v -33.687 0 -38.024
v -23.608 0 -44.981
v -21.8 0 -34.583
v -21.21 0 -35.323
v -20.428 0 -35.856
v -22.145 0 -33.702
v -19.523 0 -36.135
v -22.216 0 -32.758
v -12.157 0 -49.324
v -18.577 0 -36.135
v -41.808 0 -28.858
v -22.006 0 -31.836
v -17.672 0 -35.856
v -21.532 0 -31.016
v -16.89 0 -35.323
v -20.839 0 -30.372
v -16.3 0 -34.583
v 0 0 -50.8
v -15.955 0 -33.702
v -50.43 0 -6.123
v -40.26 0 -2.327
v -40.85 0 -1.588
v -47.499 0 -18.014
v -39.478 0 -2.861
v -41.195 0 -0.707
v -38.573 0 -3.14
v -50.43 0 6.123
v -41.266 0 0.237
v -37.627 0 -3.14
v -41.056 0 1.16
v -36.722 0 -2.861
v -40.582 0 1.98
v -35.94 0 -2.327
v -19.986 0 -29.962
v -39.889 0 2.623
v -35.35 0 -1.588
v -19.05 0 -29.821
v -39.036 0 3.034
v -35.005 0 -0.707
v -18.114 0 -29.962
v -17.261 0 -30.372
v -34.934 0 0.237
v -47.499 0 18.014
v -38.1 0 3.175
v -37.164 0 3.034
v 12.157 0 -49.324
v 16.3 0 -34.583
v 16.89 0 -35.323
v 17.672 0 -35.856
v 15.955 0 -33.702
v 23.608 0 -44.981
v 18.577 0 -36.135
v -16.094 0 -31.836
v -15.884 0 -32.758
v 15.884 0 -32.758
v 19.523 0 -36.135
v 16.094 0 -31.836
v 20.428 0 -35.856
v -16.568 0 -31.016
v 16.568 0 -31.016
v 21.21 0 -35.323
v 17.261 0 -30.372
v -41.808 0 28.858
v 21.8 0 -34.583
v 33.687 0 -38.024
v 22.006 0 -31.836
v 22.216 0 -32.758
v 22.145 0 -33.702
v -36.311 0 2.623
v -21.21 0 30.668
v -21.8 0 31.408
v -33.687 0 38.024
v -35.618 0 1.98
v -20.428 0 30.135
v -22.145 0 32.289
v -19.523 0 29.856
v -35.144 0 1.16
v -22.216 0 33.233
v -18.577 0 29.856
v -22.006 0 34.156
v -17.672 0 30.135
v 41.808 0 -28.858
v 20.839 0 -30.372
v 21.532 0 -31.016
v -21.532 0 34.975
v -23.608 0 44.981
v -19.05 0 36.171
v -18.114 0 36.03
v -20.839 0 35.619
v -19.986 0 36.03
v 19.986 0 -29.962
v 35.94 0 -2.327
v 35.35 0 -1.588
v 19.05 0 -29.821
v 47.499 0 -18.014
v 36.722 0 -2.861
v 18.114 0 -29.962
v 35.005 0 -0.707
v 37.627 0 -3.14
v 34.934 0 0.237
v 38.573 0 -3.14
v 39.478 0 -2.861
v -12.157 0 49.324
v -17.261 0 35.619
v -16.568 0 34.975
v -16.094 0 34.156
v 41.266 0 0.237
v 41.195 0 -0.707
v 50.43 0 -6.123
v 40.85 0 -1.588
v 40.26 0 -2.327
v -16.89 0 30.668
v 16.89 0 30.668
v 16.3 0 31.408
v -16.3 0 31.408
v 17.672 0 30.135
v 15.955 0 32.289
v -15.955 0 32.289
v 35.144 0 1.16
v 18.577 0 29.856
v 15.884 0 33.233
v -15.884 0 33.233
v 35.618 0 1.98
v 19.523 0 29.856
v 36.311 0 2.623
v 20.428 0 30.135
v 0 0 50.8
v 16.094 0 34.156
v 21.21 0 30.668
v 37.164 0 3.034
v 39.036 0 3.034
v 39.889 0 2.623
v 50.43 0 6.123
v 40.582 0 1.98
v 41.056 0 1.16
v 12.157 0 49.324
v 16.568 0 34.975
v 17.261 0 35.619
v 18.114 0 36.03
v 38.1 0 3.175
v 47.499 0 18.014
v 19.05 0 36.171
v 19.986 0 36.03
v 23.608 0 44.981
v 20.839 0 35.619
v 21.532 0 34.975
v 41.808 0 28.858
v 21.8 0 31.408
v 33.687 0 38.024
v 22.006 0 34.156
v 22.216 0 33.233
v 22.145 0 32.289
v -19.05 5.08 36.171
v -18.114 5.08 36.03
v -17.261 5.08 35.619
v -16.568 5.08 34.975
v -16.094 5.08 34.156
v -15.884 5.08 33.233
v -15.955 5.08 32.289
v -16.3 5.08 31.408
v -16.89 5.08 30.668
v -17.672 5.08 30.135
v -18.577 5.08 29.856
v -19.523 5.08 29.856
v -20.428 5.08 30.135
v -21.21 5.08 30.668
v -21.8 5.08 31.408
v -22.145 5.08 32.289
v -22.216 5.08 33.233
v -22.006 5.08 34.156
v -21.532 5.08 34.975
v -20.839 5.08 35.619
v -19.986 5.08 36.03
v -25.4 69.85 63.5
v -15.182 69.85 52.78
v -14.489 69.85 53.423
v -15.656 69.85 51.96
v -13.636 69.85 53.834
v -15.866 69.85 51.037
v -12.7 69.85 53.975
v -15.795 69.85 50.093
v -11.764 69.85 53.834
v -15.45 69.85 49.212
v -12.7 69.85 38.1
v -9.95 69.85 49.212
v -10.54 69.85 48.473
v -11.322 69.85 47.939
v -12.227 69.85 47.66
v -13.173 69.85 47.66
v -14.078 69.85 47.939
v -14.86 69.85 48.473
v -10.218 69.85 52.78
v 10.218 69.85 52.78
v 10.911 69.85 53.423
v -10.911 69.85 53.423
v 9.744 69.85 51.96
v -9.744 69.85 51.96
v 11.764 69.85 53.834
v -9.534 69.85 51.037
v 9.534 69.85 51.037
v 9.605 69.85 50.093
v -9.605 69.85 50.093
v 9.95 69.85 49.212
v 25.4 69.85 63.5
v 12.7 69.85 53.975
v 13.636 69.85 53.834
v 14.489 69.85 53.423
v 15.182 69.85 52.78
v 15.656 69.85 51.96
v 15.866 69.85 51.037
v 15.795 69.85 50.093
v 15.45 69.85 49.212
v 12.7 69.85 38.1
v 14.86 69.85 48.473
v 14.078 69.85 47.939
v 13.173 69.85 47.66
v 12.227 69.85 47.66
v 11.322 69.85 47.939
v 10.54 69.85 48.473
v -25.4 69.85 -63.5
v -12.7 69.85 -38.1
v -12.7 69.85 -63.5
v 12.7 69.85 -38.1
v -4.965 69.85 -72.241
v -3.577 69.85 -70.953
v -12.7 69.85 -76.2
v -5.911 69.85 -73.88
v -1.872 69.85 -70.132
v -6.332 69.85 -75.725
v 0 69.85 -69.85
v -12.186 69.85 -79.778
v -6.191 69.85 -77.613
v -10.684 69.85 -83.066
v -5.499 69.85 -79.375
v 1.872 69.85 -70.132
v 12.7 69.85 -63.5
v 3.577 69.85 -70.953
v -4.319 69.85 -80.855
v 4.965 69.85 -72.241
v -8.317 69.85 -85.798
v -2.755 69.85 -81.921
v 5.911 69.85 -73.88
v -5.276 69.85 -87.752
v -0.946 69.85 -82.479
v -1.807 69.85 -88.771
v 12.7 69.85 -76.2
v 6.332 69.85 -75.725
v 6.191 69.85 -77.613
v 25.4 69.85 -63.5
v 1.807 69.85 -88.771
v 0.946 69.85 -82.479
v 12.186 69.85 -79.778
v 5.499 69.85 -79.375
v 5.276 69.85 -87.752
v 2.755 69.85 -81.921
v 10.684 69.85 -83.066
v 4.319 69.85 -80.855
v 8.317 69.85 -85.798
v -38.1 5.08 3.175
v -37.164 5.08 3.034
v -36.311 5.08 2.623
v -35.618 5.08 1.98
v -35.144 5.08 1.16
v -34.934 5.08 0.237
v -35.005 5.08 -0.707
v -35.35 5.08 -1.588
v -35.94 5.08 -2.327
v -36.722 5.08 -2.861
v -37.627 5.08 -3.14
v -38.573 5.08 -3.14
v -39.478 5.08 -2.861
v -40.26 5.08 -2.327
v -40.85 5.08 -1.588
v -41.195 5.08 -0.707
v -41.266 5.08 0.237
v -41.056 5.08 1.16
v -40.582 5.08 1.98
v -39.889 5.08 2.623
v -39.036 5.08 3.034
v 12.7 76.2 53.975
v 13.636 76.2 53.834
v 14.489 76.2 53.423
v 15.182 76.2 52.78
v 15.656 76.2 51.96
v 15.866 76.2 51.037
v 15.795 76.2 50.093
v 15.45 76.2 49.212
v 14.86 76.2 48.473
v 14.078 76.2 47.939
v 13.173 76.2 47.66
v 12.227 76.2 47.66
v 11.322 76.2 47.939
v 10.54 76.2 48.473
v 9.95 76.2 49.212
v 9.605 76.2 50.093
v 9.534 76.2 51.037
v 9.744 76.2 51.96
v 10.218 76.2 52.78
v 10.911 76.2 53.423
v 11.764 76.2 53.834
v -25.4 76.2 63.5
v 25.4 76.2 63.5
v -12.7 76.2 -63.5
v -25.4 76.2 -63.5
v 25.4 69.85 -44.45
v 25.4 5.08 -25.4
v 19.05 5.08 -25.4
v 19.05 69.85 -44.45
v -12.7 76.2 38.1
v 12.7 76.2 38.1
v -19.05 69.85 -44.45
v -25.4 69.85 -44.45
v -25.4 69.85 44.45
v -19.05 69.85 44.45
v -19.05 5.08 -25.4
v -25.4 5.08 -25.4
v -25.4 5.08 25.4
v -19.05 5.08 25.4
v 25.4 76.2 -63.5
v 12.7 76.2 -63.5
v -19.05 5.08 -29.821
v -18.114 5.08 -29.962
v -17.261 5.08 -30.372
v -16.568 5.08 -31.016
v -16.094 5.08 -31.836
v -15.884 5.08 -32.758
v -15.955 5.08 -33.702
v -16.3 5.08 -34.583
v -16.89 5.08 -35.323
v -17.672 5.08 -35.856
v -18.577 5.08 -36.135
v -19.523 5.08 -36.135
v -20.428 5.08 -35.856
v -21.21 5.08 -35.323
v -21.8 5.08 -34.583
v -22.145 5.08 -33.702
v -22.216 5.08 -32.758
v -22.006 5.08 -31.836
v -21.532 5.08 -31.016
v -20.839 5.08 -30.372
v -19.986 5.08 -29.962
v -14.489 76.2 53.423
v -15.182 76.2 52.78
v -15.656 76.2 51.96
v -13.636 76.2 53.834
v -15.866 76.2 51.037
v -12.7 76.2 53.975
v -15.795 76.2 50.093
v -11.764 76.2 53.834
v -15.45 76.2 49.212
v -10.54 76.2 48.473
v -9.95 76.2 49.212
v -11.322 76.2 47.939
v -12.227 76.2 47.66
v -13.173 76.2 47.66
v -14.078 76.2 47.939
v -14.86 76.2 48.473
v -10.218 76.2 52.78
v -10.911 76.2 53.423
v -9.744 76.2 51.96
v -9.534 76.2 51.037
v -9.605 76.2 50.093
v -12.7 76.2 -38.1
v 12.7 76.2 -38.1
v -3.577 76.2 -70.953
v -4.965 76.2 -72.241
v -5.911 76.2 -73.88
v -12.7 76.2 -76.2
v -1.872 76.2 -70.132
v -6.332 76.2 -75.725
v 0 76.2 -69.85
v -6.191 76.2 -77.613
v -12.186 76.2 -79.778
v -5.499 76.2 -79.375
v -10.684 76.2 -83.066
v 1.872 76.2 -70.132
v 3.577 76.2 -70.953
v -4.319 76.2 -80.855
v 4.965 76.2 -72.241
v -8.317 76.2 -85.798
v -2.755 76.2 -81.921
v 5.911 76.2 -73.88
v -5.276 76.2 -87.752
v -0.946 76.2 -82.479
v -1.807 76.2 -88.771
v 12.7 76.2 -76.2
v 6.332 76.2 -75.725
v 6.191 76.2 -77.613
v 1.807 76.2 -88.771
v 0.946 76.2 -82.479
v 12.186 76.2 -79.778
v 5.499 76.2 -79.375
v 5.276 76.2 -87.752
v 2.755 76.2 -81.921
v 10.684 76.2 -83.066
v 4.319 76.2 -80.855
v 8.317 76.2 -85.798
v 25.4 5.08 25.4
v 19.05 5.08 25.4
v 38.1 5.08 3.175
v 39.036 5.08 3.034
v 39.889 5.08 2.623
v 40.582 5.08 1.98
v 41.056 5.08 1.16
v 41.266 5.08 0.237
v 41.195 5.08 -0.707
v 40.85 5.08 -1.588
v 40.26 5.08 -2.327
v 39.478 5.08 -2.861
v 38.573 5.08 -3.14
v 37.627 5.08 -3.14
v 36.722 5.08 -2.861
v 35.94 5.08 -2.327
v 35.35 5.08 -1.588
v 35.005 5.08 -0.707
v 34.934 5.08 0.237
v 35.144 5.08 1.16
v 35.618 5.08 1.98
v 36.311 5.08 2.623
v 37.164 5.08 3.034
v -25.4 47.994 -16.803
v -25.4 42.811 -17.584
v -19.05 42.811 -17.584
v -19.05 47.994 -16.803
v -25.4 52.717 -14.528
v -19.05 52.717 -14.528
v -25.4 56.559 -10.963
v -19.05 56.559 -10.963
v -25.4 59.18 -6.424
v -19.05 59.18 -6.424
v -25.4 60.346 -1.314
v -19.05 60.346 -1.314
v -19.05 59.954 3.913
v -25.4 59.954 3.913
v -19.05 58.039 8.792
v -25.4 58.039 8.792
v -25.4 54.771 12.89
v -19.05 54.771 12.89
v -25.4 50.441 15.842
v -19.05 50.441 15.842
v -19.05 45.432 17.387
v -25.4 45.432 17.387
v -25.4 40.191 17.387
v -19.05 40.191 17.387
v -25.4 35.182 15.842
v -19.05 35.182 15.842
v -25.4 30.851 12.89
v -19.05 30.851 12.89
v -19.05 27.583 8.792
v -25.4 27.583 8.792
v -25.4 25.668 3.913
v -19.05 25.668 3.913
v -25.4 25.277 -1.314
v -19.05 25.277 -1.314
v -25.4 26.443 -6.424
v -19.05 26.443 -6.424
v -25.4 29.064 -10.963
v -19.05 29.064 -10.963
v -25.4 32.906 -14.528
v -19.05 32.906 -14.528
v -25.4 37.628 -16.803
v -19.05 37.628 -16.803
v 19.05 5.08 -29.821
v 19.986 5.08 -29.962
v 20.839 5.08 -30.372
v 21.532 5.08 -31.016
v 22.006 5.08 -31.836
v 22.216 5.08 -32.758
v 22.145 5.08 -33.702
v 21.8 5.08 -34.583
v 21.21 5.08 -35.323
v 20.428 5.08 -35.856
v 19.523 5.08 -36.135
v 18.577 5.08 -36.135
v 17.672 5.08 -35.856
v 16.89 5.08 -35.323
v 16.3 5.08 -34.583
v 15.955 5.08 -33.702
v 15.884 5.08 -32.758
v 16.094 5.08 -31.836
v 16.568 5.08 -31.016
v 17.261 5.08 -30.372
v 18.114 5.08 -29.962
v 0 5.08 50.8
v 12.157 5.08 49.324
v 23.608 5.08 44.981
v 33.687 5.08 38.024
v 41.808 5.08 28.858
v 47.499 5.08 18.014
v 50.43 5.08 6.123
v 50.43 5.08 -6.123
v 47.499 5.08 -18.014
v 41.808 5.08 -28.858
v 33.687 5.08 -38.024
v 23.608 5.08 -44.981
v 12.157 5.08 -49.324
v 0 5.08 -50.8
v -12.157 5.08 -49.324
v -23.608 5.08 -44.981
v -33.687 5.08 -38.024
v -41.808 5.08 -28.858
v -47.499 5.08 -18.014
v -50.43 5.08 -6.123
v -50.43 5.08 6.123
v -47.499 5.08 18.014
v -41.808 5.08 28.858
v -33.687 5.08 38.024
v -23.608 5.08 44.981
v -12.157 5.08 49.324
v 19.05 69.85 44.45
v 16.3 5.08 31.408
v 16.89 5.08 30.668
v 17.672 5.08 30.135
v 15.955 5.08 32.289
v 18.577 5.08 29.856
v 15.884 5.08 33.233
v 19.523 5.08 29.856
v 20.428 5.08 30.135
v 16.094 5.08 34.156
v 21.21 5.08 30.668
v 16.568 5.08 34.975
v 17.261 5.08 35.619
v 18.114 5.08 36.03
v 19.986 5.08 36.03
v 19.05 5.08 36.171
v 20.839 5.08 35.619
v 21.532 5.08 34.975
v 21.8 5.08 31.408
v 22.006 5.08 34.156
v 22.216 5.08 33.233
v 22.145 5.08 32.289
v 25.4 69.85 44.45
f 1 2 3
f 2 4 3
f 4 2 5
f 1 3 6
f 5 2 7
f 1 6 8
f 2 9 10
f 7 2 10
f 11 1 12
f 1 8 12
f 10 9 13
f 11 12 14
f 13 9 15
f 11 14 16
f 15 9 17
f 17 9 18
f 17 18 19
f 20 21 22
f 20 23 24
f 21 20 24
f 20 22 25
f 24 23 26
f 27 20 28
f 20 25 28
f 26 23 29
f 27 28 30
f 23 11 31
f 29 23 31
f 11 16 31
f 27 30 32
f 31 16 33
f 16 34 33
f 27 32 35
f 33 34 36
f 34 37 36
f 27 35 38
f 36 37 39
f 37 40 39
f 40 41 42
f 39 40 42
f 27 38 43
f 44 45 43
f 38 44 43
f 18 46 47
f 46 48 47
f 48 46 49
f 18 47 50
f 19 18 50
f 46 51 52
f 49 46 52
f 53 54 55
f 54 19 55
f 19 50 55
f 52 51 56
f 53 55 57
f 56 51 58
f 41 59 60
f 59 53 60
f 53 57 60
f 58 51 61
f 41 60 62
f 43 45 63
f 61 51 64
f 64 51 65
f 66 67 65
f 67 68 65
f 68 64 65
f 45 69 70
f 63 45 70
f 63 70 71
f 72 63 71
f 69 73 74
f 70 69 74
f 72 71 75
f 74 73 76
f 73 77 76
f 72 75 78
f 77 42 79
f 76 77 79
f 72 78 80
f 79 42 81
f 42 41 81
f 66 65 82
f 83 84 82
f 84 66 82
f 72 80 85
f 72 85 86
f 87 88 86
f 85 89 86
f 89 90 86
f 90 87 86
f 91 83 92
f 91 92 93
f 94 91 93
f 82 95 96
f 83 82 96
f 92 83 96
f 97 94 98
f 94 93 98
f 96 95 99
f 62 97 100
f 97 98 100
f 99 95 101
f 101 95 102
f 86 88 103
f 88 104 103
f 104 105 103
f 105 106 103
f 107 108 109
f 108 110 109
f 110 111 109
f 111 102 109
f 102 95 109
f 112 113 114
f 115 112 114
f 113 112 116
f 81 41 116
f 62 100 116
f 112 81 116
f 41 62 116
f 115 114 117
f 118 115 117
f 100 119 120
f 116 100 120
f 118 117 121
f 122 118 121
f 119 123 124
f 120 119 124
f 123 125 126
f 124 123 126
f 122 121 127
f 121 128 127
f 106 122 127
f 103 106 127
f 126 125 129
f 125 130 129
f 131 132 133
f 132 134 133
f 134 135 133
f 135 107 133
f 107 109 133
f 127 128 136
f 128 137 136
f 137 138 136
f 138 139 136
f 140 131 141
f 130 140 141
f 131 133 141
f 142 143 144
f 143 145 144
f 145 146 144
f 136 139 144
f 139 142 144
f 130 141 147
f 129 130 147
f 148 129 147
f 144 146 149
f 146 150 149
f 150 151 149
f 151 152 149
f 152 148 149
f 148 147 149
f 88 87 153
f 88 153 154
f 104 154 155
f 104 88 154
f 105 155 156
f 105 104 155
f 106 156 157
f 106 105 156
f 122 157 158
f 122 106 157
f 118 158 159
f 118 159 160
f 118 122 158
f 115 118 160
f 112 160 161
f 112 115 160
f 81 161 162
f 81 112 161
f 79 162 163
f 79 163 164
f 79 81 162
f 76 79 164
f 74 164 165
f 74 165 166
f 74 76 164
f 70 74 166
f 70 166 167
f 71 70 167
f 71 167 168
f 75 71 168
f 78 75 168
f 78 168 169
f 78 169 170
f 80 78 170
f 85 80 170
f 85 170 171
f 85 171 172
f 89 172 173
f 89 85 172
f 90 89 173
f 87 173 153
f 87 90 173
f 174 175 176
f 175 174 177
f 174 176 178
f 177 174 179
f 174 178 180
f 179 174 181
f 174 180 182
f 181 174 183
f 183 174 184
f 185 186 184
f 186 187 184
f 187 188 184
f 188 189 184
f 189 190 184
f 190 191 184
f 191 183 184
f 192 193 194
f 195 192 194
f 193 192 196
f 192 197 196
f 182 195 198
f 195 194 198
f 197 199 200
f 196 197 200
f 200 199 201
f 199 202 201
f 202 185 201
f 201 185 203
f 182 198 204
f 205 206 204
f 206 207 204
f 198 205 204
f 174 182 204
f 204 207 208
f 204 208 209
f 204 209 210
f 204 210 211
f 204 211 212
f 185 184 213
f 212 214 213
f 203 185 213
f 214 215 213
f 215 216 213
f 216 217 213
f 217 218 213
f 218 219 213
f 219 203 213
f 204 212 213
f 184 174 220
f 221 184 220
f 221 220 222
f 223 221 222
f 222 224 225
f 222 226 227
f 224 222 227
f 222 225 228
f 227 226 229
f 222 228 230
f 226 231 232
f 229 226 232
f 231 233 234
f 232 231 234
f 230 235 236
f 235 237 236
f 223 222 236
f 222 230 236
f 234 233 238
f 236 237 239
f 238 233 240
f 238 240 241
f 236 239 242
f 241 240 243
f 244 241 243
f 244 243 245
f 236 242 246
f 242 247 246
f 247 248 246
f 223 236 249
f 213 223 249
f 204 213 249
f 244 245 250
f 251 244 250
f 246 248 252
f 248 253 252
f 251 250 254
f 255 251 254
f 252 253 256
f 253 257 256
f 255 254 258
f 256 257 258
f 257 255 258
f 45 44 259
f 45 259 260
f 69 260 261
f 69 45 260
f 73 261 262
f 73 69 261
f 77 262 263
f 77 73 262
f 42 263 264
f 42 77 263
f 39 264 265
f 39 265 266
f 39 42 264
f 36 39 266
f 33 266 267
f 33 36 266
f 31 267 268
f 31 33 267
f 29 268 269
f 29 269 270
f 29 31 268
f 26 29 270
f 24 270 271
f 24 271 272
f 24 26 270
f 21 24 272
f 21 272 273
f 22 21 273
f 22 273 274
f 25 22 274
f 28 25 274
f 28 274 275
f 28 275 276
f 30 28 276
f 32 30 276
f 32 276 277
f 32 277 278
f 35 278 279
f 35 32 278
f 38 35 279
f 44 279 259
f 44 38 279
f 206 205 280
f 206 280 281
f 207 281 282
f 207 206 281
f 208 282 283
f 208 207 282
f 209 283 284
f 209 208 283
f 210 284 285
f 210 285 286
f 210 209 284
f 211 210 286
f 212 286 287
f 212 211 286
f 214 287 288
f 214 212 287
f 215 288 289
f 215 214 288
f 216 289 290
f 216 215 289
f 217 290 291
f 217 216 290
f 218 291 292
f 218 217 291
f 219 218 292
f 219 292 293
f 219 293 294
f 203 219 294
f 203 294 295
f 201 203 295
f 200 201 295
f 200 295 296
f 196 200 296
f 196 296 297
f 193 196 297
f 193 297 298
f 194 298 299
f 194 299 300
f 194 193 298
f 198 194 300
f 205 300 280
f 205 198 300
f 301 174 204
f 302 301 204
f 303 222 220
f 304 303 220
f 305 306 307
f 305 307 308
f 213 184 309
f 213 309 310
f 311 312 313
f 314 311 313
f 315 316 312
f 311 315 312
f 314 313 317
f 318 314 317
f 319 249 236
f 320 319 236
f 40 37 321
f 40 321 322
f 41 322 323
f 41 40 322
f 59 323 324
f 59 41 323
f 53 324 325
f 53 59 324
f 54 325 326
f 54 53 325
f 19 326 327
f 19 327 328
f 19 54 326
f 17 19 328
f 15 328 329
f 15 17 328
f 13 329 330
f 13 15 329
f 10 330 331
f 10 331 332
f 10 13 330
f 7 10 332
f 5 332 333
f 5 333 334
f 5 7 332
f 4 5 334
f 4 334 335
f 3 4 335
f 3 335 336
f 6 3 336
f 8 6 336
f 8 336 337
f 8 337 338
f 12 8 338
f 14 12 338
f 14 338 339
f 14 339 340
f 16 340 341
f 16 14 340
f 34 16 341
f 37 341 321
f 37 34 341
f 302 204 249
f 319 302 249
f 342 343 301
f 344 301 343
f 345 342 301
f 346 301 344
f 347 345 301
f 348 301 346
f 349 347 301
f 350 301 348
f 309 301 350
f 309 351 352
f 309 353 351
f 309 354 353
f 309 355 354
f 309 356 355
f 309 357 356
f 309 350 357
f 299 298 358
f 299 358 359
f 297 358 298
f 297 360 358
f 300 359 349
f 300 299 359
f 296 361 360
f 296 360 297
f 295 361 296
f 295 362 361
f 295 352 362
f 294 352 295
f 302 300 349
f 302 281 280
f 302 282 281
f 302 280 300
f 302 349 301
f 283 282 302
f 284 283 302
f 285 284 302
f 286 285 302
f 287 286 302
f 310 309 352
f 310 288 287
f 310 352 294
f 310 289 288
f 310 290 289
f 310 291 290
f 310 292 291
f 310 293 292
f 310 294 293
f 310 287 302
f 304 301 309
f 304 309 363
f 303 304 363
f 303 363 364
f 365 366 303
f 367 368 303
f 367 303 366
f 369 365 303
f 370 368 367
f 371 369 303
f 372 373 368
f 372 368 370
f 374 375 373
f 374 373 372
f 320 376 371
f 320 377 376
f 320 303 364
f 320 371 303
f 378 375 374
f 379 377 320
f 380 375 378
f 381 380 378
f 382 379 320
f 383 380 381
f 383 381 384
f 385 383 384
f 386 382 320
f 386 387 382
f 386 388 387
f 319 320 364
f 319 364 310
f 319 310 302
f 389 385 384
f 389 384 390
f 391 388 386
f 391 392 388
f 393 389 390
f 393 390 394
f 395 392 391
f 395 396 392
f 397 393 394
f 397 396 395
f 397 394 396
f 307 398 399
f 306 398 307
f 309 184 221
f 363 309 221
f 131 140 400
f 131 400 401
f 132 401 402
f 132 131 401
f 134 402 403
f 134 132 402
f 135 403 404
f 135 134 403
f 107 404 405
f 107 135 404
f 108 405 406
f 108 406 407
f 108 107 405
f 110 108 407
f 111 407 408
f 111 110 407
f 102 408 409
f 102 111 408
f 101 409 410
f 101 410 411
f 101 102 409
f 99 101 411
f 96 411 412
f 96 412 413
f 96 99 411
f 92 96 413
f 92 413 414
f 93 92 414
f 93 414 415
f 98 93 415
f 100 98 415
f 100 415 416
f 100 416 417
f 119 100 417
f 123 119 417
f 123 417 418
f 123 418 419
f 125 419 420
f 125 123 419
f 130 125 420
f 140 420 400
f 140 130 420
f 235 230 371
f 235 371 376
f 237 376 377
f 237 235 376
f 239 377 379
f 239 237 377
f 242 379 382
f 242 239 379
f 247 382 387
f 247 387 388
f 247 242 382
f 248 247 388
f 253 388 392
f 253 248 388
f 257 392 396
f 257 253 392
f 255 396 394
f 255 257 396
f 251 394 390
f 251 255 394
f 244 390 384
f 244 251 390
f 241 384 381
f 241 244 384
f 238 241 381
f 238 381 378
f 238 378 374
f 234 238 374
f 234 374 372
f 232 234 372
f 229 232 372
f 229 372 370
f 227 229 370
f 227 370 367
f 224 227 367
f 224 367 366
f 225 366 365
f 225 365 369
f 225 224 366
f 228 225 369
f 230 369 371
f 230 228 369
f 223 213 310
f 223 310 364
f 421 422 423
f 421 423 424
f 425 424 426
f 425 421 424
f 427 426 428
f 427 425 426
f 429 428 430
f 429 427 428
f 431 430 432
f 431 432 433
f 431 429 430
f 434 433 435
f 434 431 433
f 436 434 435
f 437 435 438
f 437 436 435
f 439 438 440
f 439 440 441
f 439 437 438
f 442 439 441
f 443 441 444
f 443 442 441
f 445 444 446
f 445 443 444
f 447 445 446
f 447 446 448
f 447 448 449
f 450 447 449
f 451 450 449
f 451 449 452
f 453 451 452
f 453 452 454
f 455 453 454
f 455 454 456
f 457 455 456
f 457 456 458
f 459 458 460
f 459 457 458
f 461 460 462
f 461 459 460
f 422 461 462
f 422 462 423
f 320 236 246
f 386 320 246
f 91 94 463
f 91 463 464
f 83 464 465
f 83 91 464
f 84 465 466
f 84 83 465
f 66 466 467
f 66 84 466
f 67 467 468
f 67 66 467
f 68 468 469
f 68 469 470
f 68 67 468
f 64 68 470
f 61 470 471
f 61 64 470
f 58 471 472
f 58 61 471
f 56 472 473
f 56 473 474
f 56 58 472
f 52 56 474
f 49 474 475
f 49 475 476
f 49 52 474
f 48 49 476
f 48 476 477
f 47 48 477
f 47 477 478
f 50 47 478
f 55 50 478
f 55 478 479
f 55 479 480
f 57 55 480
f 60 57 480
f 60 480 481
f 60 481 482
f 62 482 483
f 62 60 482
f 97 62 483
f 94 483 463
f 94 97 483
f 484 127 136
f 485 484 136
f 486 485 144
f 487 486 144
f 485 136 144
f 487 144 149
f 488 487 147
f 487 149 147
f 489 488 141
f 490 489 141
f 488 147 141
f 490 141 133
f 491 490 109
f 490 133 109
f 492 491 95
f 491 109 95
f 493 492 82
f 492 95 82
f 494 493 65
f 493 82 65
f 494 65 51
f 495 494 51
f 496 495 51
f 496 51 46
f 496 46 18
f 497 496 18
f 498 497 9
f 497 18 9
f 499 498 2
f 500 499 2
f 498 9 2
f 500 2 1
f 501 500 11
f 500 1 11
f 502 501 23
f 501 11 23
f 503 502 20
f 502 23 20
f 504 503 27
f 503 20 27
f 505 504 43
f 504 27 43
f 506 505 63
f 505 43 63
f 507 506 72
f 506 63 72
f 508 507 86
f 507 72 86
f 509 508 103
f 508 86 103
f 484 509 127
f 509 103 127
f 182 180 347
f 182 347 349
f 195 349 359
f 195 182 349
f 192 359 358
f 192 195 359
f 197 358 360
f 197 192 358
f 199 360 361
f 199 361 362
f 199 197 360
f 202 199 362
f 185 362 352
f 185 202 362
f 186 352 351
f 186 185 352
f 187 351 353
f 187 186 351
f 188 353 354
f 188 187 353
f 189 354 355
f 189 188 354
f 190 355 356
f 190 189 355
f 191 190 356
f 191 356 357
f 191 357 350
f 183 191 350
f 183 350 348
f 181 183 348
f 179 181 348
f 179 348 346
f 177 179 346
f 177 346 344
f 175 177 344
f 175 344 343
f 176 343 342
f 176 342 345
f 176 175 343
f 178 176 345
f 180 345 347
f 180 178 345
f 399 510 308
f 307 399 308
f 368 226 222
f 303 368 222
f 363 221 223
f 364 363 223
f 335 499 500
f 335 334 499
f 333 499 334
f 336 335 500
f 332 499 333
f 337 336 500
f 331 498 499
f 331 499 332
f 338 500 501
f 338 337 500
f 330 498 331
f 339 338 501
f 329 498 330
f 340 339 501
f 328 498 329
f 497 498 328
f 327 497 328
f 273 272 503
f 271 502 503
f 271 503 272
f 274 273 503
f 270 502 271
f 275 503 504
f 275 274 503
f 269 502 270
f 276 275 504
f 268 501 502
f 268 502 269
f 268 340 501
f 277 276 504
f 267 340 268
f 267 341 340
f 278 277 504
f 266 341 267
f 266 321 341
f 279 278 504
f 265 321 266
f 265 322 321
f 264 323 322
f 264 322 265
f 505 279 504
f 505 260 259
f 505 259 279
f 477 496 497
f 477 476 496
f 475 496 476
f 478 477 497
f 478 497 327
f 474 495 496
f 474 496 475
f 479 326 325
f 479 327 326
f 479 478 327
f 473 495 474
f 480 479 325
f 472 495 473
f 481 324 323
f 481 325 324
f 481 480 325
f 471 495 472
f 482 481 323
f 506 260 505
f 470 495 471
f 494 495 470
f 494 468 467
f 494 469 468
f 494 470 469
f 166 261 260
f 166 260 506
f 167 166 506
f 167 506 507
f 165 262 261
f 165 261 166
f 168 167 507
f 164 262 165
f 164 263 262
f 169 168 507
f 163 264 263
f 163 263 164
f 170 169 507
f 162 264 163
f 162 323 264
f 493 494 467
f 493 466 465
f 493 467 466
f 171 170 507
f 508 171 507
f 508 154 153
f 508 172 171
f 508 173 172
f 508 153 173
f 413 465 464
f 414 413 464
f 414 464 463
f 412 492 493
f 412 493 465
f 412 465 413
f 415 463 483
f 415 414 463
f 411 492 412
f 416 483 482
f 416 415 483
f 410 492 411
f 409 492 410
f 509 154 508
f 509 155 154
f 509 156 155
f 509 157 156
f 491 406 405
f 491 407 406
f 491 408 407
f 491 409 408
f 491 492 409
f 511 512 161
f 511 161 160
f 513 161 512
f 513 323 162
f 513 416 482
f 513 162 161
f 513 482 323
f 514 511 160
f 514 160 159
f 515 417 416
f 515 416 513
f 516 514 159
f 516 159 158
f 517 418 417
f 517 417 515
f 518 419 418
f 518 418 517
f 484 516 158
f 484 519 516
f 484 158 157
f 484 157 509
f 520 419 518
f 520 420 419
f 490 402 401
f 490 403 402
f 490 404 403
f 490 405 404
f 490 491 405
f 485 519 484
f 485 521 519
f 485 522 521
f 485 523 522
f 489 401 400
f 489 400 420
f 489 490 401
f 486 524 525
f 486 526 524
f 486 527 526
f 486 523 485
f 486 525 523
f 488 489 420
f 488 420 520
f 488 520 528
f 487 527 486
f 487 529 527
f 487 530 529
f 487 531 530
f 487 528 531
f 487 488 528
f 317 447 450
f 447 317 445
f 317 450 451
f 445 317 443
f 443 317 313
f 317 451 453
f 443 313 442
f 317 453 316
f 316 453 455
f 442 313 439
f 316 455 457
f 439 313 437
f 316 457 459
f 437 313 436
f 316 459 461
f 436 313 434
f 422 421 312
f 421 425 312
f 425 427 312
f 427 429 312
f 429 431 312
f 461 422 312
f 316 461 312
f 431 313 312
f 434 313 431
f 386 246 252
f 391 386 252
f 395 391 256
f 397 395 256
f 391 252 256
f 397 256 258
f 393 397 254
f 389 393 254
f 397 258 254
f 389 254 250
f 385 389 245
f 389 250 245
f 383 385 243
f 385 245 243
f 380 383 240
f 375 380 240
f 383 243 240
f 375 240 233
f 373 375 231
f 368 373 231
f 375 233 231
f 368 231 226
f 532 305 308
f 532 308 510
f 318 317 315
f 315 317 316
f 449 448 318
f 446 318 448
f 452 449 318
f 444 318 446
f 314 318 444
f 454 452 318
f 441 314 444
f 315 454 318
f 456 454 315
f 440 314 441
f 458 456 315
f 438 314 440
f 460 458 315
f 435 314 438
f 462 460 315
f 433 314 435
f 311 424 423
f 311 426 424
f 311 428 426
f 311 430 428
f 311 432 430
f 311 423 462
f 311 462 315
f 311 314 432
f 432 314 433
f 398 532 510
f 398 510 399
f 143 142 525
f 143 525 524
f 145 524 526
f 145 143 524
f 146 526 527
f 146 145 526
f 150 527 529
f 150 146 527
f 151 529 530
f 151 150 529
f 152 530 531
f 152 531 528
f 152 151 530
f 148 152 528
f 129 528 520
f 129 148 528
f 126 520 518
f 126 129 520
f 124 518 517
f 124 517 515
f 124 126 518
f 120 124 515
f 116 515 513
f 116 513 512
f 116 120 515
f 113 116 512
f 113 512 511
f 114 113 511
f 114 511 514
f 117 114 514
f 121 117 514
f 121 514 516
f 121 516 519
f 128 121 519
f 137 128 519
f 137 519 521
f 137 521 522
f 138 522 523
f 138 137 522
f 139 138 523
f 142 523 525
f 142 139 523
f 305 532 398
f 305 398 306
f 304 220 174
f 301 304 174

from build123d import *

# Parameters (mm, degrees)
SKETCH1_R      = 50.8
SKETCH1_R_2    = 3.175
EXTRUDE1_DEPTH = 5.08
SKETCH10_R     = 6.35
SKETCH10_R_2   = 3.175
SKETCH10_W     = 25.4
SKETCH10_H     = 76.2
EXTRUDE3_DEPTH = 6.35
SKETCH16_R     = 17.583801549
EXTRUDE4_DEPTH = 6.35
EXTRUDE5_DEPTH = 6.35


with BuildPart() as part:
    # Sketch1 → Extrude1 (new body)
    with BuildSketch(Plane(origin=(0, 0, 0), x_dir=(1, 0, 0), z_dir=(0, 1, 0))):
        Circle(SKETCH1_R)
        with Locations((38.1, 0)):
            Circle(SKETCH1_R_2, mode=Mode.SUBTRACT)
        with Locations((19.05, -32.995567884)):
            Circle(SKETCH1_R_2, mode=Mode.SUBTRACT)
        with Locations((-19.05, -32.995567884)):
            Circle(SKETCH1_R_2, mode=Mode.SUBTRACT)
        with Locations((-38.1, 0)):
            Circle(SKETCH1_R_2, mode=Mode.SUBTRACT)
        with Locations((-19.05, 32.995567884)):
            Circle(SKETCH1_R_2, mode=Mode.SUBTRACT)
        with Locations((19.05, 32.995567884)):
            Circle(SKETCH1_R_2, mode=Mode.SUBTRACT)
    extrude(amount=EXTRUDE1_DEPTH)


with BuildPart() as body_2:
    # Sketch10 → Extrude3 (new body)
    with BuildSketch(Plane(origin=(0, 69.85, 0), x_dir=(1, 0, 0), z_dir=(0, 1, 0))):
        with BuildLine():
            Line((-12.7, 63.5), (-25.4, 63.5))
            Line((-25.4, 63.5), (-25.4, -63.5))
            Line((-25.4, -63.5), (25.4, -63.5))
            Line((25.4, -63.5), (25.4, 63.5))
            Line((25.4, 63.5), (12.7, 63.5))
            Line((12.7, 63.5), (12.7, 76.2))
            ThreePointArc((12.7, 76.2), (0, 88.9), (-12.7, 76.2))
            Line((-12.7, 76.2), (-12.7, 63.5))
        make_face()
        with Locations((0, 76.2)):
            Circle(SKETCH10_R, mode=Mode.SUBTRACT)
        with Locations((-12.7, -50.8)):
            Circle(SKETCH10_R_2, mode=Mode.SUBTRACT)
        with Locations((12.7, -50.8)):
            Circle(SKETCH10_R_2, mode=Mode.SUBTRACT)
        Rectangle(SKETCH10_W, SKETCH10_H, mode=Mode.SUBTRACT)
    extrude(amount=EXTRUDE3_DEPTH)


with BuildPart() as body_3:
    # Sketch16 → Extrude4 (new body)
    with BuildSketch(Plane(origin=(-25.4, 0, 0), x_dir=(0, 0, -1), z_dir=(1, 0, 0))):
        Polygon((0, 5.08), (25.4, 5.08), (44.45, 69.85), (-44.45, 69.85), (-25.4, 5.08), align=None)
        with Locations((0, 42.811356357)):
            Circle(SKETCH16_R, mode=Mode.SUBTRACT)
    extrude(amount=EXTRUDE4_DEPTH)


with BuildPart() as body_4:
    # Sketch11 → Extrude5 (new body)
    with BuildSketch(Plane(origin=(25.4, 0, 0), x_dir=(0, 0, -1), z_dir=(1, 0, 0))):
        Polygon((0, 5.08), (25.4, 5.08), (44.45, 69.85), (-44.45, 69.85), (-25.4, 5.08), align=None)
    extrude(amount=-EXTRUDE5_DEPTH)


solid = Compound([part.part, body_2.part, body_3.part, body_4.part])
